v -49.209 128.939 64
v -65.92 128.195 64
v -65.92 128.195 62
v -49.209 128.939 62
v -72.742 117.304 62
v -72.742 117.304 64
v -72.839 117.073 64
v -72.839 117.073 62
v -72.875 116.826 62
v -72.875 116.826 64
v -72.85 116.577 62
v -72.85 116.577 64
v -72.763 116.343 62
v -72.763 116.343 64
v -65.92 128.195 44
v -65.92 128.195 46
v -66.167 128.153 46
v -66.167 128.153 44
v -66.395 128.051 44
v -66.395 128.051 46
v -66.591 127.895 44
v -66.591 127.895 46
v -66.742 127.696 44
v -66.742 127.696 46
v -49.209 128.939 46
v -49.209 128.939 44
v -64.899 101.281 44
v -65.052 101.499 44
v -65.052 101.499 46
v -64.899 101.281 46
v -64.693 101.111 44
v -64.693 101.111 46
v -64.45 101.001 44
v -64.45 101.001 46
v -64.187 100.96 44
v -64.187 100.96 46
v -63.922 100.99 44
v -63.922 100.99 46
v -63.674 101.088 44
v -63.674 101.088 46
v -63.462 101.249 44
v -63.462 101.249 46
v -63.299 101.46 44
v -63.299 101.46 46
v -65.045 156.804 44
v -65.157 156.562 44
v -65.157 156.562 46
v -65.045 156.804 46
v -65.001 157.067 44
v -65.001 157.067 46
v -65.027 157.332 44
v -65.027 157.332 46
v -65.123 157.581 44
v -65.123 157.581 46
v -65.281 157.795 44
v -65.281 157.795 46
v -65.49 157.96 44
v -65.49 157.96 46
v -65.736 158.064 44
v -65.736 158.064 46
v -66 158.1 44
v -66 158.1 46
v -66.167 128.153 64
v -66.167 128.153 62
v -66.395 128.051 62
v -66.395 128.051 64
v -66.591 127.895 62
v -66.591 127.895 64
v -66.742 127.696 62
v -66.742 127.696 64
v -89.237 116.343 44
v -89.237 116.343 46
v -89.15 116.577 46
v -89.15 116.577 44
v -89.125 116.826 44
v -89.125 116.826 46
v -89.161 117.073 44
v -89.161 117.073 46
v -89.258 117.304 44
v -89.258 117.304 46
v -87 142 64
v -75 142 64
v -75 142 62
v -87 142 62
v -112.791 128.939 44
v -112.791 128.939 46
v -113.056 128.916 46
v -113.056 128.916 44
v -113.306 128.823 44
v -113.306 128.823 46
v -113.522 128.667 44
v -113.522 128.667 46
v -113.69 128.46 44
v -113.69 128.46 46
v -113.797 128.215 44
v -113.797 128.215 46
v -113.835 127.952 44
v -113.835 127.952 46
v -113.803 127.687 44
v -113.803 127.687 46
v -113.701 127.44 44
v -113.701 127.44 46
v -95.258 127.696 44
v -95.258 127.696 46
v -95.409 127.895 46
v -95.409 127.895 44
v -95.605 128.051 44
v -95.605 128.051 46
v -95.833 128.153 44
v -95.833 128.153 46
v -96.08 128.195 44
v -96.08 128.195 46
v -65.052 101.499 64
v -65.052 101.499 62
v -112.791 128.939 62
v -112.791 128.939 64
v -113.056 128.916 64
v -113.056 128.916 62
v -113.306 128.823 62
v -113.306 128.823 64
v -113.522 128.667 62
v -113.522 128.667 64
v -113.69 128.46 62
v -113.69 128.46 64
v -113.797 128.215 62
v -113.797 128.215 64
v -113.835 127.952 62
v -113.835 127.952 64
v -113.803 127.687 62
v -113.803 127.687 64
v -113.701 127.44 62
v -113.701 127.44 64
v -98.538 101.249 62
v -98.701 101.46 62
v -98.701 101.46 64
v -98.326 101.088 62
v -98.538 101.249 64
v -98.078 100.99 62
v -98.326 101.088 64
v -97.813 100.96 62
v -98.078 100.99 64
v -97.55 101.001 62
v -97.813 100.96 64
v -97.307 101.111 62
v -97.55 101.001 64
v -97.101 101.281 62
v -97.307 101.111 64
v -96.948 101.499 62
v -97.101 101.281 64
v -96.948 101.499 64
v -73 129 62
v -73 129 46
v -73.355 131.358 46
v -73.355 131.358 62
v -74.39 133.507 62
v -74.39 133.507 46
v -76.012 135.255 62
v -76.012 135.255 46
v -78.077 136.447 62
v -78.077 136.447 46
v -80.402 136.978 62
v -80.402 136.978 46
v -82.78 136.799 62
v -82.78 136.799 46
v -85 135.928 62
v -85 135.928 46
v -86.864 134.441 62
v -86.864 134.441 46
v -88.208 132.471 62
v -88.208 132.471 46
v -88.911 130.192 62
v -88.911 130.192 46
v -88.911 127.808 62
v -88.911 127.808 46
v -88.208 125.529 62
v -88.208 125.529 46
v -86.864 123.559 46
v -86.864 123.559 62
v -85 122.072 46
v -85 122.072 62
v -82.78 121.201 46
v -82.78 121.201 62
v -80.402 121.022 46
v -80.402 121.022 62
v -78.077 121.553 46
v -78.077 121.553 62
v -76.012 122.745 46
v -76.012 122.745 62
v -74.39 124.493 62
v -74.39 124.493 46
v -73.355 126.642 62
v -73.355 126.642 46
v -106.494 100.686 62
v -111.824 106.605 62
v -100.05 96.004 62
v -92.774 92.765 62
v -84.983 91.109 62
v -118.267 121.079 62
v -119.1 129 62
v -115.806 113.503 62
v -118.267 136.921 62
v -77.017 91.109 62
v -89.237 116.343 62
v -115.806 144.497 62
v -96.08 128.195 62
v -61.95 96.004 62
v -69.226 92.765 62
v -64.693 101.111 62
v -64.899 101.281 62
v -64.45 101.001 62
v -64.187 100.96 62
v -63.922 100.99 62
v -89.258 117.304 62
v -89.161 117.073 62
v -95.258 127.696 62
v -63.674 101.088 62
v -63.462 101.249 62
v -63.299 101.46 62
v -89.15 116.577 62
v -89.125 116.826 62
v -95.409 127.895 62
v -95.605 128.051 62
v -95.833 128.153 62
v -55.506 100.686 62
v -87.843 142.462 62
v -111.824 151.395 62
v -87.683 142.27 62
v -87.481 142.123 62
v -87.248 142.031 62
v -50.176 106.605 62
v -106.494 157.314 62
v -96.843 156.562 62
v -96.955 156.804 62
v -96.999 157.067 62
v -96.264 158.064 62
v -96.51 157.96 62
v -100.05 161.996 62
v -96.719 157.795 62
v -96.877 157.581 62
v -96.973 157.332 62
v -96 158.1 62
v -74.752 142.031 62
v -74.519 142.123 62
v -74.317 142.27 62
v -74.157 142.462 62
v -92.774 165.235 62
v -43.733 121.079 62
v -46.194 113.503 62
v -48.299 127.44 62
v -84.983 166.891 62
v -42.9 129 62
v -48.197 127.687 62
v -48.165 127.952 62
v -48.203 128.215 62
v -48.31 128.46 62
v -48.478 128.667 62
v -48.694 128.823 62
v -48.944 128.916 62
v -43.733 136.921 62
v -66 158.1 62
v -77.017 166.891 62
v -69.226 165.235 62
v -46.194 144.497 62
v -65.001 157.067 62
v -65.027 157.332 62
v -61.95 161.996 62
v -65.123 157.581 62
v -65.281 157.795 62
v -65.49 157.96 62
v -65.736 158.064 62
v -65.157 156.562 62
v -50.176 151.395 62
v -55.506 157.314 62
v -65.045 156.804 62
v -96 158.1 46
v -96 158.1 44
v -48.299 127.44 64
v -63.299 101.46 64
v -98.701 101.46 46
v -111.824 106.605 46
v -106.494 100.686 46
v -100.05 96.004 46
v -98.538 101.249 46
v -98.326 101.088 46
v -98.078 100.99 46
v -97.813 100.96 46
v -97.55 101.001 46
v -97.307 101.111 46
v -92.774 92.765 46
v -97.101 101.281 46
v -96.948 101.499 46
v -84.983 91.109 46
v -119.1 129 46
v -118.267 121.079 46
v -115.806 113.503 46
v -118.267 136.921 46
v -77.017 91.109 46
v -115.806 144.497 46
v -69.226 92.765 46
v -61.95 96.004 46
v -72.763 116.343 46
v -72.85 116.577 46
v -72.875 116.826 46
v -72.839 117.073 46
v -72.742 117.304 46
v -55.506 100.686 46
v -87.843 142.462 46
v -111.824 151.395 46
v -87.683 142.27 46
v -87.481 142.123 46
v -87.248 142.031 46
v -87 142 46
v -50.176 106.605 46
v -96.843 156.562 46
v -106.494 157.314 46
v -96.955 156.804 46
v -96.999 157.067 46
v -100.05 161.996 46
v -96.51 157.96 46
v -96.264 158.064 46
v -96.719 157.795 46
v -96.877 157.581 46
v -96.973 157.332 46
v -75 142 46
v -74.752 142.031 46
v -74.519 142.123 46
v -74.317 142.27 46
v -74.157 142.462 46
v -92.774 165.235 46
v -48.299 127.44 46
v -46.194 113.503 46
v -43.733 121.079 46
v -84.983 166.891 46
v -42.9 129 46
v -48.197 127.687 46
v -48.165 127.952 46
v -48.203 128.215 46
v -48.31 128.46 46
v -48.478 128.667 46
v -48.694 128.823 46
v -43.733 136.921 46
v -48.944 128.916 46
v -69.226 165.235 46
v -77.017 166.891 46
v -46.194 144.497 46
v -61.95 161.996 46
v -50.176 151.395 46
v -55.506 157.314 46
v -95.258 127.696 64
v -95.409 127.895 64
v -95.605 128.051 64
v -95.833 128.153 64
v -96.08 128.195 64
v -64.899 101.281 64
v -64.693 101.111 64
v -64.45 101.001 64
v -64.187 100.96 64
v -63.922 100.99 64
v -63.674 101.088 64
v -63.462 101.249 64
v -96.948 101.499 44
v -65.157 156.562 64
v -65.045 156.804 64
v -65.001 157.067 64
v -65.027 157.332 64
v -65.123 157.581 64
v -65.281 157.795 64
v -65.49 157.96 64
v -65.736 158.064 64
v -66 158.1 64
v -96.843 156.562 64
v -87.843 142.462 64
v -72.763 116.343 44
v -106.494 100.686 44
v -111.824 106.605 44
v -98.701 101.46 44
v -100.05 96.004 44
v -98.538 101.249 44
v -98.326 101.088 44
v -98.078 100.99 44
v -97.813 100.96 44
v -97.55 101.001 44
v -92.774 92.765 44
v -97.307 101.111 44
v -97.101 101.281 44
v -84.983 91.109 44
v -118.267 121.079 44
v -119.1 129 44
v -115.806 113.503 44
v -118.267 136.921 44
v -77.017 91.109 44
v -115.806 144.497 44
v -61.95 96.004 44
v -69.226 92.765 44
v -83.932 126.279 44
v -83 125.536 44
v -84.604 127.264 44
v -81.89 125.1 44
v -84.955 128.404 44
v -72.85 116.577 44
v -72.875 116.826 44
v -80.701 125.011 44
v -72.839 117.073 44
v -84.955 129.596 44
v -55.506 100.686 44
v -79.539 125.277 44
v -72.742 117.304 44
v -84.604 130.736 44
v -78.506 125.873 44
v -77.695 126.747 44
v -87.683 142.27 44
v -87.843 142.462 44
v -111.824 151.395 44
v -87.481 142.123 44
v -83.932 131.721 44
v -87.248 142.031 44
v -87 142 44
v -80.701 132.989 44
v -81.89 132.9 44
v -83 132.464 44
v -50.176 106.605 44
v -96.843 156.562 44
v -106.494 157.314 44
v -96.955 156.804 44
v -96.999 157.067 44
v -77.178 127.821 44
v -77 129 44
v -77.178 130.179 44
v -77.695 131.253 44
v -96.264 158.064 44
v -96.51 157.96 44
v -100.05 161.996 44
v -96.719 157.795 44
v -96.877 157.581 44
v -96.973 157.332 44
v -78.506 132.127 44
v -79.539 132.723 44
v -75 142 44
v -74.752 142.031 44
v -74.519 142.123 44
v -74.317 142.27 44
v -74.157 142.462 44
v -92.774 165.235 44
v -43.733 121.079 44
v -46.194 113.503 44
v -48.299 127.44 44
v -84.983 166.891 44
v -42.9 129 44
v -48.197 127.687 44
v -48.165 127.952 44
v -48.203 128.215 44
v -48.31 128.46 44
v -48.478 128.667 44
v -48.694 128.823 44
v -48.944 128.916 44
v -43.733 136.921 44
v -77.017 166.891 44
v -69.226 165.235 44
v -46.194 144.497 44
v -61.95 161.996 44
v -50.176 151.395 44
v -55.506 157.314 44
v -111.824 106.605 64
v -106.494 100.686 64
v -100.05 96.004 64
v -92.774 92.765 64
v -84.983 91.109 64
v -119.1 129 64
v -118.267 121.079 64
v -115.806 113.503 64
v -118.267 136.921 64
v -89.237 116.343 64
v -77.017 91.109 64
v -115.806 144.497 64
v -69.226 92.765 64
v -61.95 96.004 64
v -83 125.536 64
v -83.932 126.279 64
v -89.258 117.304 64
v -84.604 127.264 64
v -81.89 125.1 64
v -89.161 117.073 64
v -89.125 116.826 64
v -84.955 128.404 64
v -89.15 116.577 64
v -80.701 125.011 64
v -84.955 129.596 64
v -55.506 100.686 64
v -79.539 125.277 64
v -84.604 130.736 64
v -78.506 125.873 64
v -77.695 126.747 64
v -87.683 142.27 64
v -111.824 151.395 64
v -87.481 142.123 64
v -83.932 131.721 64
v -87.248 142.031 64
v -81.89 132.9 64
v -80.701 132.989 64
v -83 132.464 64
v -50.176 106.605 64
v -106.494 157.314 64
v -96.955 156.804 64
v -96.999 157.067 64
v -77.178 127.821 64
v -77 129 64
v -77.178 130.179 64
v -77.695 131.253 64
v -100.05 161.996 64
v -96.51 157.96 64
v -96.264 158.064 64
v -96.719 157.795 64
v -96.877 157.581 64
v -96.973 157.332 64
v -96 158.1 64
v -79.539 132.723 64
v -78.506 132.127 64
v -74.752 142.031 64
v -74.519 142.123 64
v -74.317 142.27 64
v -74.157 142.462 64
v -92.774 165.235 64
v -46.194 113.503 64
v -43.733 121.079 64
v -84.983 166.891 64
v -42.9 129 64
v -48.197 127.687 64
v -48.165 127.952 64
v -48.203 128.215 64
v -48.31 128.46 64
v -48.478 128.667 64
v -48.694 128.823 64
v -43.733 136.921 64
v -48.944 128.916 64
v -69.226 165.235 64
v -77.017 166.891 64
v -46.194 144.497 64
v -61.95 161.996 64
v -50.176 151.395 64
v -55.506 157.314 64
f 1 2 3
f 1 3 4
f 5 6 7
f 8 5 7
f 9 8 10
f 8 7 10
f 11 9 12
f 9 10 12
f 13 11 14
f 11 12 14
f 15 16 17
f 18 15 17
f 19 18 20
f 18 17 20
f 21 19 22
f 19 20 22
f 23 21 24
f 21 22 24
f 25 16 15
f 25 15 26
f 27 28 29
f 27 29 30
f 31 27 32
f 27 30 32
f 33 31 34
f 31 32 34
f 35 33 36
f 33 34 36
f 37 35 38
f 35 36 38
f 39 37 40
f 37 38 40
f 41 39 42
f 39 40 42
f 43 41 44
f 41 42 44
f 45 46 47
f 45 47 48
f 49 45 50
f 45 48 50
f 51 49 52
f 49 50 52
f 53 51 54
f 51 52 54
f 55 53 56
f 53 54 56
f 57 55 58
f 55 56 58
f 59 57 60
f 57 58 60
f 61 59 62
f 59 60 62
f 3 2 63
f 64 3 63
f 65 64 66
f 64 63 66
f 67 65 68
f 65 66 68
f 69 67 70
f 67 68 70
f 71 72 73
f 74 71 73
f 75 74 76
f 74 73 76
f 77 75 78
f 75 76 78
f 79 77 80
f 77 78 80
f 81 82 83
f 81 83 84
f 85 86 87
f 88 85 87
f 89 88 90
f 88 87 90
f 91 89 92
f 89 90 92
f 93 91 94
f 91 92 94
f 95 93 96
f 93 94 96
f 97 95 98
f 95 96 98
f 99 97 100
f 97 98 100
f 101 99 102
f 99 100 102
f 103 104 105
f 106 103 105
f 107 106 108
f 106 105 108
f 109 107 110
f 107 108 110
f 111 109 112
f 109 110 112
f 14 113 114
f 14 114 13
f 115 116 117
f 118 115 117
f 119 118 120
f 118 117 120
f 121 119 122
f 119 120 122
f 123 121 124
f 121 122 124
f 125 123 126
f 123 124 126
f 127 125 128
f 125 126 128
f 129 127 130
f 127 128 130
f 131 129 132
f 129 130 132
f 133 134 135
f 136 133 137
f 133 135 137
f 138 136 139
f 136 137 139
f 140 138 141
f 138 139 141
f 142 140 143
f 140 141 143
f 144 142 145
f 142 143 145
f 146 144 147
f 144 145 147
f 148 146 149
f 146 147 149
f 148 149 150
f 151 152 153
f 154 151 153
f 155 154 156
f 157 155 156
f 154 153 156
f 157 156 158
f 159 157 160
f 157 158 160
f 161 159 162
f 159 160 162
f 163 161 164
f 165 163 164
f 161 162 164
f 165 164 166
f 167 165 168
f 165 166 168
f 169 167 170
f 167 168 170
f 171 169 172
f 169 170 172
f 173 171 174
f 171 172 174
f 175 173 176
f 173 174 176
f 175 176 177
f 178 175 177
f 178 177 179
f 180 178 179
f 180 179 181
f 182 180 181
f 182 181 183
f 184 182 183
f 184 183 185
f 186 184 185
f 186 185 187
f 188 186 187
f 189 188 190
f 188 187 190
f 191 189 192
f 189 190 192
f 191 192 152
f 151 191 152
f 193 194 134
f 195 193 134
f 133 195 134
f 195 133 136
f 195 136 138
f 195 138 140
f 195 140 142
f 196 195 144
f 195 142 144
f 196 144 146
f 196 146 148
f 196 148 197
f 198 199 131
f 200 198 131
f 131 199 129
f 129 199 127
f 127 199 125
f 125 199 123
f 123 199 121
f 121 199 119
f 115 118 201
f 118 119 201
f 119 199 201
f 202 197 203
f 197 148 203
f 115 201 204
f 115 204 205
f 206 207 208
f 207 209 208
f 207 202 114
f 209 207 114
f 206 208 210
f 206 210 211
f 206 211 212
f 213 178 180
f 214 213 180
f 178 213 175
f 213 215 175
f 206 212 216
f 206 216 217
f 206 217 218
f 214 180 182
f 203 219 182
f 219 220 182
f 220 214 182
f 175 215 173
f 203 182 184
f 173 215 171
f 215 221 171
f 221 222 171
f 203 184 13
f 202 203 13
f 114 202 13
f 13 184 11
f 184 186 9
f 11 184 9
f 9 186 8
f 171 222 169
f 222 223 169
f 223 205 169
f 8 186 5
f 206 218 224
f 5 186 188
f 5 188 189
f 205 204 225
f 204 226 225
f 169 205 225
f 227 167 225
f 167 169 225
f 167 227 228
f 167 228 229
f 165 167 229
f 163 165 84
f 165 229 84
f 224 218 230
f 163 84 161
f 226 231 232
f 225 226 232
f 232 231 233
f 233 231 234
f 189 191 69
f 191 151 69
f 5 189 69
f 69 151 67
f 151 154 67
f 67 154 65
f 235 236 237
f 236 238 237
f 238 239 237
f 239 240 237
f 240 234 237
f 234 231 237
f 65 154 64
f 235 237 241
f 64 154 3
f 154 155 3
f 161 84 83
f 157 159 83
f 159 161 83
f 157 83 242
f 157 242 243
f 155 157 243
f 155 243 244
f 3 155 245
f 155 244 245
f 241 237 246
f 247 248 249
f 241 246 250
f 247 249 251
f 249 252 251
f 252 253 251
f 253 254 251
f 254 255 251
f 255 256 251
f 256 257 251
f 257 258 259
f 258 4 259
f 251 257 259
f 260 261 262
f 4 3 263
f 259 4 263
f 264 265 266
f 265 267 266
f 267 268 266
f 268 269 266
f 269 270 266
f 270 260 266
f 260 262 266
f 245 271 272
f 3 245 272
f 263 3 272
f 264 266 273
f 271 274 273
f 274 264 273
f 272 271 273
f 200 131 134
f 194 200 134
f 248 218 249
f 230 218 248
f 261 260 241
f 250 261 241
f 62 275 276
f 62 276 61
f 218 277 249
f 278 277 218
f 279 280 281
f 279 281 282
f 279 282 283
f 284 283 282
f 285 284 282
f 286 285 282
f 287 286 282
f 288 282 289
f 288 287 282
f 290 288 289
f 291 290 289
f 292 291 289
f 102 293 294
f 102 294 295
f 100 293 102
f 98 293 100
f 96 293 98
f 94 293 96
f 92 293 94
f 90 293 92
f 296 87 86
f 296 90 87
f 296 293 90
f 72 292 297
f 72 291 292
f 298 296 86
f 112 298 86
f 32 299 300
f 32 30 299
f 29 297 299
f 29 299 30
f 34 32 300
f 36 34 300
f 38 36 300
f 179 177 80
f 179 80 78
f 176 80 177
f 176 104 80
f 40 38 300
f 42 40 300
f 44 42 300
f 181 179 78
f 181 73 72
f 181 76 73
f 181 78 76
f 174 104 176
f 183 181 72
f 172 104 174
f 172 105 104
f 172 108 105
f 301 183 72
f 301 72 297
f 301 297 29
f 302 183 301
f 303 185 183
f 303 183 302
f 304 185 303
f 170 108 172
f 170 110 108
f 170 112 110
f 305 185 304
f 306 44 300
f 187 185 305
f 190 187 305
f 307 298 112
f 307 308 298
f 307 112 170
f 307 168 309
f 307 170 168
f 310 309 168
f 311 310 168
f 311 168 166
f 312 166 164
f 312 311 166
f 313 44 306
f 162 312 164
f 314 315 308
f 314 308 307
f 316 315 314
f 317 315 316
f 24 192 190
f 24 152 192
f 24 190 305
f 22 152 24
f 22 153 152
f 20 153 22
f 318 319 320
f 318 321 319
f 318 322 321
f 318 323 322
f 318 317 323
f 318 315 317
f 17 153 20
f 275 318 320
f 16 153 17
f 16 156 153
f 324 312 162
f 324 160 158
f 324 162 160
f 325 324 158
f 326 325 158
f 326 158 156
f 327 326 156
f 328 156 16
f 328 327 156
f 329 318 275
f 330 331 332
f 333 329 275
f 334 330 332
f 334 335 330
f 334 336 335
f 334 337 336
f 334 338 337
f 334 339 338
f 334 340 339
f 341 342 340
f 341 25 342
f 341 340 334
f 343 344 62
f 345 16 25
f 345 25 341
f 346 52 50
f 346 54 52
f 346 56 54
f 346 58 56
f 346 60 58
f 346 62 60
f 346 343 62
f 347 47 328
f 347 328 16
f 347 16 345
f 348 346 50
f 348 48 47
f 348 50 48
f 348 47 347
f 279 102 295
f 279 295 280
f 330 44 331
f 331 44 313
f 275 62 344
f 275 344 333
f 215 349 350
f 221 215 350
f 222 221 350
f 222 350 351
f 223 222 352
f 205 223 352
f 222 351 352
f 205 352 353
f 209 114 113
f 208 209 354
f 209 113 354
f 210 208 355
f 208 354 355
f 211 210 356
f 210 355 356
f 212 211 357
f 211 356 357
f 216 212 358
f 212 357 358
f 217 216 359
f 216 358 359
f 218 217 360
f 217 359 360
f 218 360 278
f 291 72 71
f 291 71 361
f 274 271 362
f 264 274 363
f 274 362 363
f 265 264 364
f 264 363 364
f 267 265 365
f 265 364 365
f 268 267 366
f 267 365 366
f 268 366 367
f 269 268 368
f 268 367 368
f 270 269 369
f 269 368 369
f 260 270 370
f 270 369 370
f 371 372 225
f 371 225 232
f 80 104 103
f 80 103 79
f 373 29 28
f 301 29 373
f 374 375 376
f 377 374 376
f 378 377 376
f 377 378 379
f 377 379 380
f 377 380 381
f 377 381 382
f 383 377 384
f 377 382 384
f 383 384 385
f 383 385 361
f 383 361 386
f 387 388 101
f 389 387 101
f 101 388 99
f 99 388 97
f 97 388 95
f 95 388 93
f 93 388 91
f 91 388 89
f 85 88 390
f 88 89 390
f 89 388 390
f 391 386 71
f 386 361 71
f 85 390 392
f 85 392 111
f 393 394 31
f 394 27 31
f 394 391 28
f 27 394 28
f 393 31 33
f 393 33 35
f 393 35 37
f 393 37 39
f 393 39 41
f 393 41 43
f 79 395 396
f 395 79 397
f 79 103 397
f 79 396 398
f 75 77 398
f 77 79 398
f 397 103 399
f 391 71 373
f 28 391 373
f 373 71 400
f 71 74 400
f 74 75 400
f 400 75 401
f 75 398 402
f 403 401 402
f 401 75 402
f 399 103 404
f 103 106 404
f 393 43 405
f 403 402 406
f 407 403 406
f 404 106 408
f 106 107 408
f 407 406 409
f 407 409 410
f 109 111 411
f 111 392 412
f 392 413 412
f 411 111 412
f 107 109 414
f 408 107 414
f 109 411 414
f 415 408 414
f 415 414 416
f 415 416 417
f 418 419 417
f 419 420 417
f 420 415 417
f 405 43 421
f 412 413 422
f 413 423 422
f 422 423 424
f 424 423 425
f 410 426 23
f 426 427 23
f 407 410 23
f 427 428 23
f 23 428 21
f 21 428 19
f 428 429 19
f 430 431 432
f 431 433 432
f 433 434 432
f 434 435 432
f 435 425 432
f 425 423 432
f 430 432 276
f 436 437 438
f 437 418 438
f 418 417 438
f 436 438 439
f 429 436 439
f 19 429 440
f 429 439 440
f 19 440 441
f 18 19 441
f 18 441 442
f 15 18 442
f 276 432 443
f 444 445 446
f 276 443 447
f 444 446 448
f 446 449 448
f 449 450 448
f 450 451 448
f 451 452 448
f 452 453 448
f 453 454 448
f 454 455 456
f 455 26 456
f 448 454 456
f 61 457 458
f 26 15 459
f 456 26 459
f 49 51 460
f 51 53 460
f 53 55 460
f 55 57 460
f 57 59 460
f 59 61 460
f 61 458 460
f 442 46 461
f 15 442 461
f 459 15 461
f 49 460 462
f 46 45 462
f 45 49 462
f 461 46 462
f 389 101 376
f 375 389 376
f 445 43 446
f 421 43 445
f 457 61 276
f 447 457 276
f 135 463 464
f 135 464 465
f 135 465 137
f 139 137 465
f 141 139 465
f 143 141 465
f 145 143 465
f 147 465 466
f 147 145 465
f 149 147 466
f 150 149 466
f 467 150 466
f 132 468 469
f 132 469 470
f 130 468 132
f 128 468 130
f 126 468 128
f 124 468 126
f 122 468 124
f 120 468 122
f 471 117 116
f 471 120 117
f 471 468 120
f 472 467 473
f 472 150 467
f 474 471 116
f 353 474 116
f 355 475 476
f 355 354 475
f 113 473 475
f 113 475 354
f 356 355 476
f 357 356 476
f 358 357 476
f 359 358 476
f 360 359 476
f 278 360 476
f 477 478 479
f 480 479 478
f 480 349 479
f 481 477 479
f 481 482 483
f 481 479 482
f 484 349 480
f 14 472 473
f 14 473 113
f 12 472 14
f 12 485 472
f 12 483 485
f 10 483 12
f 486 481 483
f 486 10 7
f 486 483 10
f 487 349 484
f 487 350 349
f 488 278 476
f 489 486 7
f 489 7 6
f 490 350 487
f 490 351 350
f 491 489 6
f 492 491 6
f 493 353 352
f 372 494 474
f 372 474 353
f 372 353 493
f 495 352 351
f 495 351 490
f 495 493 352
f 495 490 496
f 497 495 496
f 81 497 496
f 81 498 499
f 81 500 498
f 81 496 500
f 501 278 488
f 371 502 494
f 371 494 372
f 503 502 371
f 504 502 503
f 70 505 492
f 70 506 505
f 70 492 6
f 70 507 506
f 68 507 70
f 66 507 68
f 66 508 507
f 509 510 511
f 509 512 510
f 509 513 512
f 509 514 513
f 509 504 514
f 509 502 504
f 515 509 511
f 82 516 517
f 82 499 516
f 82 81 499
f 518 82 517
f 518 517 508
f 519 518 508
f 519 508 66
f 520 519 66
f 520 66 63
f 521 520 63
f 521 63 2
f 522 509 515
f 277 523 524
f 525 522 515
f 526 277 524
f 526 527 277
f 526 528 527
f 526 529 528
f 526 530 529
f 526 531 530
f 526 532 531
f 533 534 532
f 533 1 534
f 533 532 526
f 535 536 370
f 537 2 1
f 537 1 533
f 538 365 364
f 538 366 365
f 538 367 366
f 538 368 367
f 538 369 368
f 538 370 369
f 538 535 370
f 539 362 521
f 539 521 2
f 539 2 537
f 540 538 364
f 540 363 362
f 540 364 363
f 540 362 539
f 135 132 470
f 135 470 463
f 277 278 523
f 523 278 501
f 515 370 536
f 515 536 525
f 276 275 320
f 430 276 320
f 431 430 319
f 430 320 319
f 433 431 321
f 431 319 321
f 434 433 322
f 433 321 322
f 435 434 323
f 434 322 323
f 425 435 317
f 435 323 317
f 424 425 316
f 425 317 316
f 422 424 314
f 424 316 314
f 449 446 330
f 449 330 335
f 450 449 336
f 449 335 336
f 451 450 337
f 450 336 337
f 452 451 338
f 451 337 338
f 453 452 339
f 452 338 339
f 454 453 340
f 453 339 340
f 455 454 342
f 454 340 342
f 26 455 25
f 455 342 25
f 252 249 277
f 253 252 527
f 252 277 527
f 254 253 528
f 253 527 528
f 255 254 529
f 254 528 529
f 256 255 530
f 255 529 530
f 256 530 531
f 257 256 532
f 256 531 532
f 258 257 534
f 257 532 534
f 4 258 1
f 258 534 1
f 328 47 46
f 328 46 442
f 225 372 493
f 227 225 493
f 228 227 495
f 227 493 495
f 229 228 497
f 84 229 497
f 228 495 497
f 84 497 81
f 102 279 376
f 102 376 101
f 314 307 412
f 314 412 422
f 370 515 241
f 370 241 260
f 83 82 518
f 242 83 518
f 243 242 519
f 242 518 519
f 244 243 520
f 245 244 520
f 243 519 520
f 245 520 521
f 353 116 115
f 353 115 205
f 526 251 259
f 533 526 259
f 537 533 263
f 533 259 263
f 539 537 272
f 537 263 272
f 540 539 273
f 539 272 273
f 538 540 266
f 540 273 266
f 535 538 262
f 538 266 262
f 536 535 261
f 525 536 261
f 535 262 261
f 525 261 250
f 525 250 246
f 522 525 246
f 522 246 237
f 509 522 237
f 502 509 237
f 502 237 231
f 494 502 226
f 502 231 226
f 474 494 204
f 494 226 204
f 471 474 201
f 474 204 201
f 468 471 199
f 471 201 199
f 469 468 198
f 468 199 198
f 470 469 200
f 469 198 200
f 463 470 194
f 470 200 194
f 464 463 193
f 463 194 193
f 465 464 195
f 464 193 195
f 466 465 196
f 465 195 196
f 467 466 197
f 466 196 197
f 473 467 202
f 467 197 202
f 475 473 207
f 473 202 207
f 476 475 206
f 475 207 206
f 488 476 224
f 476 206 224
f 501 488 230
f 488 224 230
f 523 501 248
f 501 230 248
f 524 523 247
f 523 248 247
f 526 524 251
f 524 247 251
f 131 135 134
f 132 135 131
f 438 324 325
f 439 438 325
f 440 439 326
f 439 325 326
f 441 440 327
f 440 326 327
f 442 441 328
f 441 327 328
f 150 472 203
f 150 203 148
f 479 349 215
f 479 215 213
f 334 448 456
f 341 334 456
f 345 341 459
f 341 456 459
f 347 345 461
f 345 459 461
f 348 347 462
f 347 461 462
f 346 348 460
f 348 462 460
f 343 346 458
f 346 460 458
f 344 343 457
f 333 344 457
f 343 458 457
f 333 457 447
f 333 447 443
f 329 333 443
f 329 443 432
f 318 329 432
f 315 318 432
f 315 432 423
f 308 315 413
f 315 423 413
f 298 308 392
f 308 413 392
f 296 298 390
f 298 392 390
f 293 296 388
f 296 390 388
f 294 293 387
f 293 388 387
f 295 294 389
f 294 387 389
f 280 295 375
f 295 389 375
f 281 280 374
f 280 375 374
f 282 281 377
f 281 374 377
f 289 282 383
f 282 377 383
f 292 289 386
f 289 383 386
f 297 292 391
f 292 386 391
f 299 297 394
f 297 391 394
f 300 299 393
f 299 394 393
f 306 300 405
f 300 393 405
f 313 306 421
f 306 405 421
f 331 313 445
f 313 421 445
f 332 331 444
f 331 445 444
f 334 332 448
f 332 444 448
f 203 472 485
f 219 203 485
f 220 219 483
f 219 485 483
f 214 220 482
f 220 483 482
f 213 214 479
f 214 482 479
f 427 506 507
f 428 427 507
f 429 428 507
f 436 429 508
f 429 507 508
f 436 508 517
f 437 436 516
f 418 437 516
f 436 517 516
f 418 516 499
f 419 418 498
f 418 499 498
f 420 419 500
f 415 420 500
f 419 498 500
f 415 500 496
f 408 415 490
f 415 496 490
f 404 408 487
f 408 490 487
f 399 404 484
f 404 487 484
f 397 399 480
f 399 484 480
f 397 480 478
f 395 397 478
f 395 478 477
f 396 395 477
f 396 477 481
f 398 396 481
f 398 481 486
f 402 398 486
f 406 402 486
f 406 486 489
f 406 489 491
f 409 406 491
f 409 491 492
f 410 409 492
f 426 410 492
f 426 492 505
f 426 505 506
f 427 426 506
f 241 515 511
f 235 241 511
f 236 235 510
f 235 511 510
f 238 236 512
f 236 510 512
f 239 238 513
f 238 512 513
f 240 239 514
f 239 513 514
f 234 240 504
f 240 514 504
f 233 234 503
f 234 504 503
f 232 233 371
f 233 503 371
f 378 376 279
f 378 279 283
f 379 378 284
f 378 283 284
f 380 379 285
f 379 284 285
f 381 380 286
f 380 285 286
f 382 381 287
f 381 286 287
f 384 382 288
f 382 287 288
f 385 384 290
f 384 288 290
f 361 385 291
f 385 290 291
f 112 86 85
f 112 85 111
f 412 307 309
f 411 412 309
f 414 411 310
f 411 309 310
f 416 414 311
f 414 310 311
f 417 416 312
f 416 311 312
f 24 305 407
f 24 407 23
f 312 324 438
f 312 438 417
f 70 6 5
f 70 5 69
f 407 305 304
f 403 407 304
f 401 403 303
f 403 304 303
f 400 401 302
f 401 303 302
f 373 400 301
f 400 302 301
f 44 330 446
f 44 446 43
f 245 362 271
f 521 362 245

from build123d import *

# Parameters (mm, degrees)
SKETCH003_R        = 38.1
PAD003_DEPTH       = 2
SKETCH004_R        = 8
PAD004_DEPTH       = 16
SKETCH005_R        = 38.1
PAD005_DEPTH       = 2
POCKET_DEPTH       = 239.207569
POLARPATTERN_COUNT = 3
SKETCH007_R        = 4
POCKET001_DEPTH    = 20.001


with BuildPart() as part:
    # Sketch003 → Pad003 (new body)
    with BuildSketch(Plane.XY):
        Circle(SKETCH003_R)
    extrude(amount=PAD003_DEPTH)

    # Sketch004 (on Face3 of Pad003) → Pad004 (join)
    with BuildSketch(Plane.XY.offset(2)):
        Circle(SKETCH004_R)
    extrude(amount=PAD004_DEPTH)

    # Sketch005 (on Face5 of Pad004) → Pad005 (join)
    with BuildSketch(Plane.XY.offset(18)):
        Circle(SKETCH005_R)
    extrude(amount=PAD005_DEPTH)

    # Sketch006 (on Face3 of Pad005) → Pocket (cut, through all)
    with BuildSketch(Plane.XY.offset(20)):
        with BuildLine():
            Line((-15, 29.1), (15, 29.1))
            ThreePointArc((15.842922, 27.561965), (15.876937, 28.580606), (15, 29.1))
            Line((15.842922, 27.561965), (6.842922, 13.461965))
            ThreePointArc((6, 13), (6.480606, 13.123063), (6.842922, 13.461965))
            Line((6, 13), (-6, 13))
            ThreePointArc((-6.842922, 13.461965), (-6.480606, 13.123063), (-6, 13))
            Line((-6.842922, 13.461965), (-15.842922, 27.561965))
            ThreePointArc((-15, 29.1), (-15.876937, 28.580606), (-15.842922, 27.561965))
        make_face()
    pocket = extrude(amount=-POCKET_DEPTH, mode=Mode.SUBTRACT)

    # PolarPattern: Pocket ×3 about axis
    polarpattern_axis = Axis((0, 0, 20), (0, 0, 1))
    for i in range(1, POLARPATTERN_COUNT):
        add(pocket.rotate(polarpattern_axis, i * 360 / POLARPATTERN_COUNT), mode=Mode.SUBTRACT)

    # Sketch007 (on Face3 of PolarPattern) → Pocket001 (cut, through all)
    with BuildSketch(Plane.XY.offset(20)):
        Circle(SKETCH007_R)
    extrude(amount=-POCKET001_DEPTH, mode=Mode.SUBTRACT)


with BuildPart() as part_1:
    # Body012 placement: moved
    add(part.part.moved(Location((-81, 129, 44))))


solid = part_1.part
